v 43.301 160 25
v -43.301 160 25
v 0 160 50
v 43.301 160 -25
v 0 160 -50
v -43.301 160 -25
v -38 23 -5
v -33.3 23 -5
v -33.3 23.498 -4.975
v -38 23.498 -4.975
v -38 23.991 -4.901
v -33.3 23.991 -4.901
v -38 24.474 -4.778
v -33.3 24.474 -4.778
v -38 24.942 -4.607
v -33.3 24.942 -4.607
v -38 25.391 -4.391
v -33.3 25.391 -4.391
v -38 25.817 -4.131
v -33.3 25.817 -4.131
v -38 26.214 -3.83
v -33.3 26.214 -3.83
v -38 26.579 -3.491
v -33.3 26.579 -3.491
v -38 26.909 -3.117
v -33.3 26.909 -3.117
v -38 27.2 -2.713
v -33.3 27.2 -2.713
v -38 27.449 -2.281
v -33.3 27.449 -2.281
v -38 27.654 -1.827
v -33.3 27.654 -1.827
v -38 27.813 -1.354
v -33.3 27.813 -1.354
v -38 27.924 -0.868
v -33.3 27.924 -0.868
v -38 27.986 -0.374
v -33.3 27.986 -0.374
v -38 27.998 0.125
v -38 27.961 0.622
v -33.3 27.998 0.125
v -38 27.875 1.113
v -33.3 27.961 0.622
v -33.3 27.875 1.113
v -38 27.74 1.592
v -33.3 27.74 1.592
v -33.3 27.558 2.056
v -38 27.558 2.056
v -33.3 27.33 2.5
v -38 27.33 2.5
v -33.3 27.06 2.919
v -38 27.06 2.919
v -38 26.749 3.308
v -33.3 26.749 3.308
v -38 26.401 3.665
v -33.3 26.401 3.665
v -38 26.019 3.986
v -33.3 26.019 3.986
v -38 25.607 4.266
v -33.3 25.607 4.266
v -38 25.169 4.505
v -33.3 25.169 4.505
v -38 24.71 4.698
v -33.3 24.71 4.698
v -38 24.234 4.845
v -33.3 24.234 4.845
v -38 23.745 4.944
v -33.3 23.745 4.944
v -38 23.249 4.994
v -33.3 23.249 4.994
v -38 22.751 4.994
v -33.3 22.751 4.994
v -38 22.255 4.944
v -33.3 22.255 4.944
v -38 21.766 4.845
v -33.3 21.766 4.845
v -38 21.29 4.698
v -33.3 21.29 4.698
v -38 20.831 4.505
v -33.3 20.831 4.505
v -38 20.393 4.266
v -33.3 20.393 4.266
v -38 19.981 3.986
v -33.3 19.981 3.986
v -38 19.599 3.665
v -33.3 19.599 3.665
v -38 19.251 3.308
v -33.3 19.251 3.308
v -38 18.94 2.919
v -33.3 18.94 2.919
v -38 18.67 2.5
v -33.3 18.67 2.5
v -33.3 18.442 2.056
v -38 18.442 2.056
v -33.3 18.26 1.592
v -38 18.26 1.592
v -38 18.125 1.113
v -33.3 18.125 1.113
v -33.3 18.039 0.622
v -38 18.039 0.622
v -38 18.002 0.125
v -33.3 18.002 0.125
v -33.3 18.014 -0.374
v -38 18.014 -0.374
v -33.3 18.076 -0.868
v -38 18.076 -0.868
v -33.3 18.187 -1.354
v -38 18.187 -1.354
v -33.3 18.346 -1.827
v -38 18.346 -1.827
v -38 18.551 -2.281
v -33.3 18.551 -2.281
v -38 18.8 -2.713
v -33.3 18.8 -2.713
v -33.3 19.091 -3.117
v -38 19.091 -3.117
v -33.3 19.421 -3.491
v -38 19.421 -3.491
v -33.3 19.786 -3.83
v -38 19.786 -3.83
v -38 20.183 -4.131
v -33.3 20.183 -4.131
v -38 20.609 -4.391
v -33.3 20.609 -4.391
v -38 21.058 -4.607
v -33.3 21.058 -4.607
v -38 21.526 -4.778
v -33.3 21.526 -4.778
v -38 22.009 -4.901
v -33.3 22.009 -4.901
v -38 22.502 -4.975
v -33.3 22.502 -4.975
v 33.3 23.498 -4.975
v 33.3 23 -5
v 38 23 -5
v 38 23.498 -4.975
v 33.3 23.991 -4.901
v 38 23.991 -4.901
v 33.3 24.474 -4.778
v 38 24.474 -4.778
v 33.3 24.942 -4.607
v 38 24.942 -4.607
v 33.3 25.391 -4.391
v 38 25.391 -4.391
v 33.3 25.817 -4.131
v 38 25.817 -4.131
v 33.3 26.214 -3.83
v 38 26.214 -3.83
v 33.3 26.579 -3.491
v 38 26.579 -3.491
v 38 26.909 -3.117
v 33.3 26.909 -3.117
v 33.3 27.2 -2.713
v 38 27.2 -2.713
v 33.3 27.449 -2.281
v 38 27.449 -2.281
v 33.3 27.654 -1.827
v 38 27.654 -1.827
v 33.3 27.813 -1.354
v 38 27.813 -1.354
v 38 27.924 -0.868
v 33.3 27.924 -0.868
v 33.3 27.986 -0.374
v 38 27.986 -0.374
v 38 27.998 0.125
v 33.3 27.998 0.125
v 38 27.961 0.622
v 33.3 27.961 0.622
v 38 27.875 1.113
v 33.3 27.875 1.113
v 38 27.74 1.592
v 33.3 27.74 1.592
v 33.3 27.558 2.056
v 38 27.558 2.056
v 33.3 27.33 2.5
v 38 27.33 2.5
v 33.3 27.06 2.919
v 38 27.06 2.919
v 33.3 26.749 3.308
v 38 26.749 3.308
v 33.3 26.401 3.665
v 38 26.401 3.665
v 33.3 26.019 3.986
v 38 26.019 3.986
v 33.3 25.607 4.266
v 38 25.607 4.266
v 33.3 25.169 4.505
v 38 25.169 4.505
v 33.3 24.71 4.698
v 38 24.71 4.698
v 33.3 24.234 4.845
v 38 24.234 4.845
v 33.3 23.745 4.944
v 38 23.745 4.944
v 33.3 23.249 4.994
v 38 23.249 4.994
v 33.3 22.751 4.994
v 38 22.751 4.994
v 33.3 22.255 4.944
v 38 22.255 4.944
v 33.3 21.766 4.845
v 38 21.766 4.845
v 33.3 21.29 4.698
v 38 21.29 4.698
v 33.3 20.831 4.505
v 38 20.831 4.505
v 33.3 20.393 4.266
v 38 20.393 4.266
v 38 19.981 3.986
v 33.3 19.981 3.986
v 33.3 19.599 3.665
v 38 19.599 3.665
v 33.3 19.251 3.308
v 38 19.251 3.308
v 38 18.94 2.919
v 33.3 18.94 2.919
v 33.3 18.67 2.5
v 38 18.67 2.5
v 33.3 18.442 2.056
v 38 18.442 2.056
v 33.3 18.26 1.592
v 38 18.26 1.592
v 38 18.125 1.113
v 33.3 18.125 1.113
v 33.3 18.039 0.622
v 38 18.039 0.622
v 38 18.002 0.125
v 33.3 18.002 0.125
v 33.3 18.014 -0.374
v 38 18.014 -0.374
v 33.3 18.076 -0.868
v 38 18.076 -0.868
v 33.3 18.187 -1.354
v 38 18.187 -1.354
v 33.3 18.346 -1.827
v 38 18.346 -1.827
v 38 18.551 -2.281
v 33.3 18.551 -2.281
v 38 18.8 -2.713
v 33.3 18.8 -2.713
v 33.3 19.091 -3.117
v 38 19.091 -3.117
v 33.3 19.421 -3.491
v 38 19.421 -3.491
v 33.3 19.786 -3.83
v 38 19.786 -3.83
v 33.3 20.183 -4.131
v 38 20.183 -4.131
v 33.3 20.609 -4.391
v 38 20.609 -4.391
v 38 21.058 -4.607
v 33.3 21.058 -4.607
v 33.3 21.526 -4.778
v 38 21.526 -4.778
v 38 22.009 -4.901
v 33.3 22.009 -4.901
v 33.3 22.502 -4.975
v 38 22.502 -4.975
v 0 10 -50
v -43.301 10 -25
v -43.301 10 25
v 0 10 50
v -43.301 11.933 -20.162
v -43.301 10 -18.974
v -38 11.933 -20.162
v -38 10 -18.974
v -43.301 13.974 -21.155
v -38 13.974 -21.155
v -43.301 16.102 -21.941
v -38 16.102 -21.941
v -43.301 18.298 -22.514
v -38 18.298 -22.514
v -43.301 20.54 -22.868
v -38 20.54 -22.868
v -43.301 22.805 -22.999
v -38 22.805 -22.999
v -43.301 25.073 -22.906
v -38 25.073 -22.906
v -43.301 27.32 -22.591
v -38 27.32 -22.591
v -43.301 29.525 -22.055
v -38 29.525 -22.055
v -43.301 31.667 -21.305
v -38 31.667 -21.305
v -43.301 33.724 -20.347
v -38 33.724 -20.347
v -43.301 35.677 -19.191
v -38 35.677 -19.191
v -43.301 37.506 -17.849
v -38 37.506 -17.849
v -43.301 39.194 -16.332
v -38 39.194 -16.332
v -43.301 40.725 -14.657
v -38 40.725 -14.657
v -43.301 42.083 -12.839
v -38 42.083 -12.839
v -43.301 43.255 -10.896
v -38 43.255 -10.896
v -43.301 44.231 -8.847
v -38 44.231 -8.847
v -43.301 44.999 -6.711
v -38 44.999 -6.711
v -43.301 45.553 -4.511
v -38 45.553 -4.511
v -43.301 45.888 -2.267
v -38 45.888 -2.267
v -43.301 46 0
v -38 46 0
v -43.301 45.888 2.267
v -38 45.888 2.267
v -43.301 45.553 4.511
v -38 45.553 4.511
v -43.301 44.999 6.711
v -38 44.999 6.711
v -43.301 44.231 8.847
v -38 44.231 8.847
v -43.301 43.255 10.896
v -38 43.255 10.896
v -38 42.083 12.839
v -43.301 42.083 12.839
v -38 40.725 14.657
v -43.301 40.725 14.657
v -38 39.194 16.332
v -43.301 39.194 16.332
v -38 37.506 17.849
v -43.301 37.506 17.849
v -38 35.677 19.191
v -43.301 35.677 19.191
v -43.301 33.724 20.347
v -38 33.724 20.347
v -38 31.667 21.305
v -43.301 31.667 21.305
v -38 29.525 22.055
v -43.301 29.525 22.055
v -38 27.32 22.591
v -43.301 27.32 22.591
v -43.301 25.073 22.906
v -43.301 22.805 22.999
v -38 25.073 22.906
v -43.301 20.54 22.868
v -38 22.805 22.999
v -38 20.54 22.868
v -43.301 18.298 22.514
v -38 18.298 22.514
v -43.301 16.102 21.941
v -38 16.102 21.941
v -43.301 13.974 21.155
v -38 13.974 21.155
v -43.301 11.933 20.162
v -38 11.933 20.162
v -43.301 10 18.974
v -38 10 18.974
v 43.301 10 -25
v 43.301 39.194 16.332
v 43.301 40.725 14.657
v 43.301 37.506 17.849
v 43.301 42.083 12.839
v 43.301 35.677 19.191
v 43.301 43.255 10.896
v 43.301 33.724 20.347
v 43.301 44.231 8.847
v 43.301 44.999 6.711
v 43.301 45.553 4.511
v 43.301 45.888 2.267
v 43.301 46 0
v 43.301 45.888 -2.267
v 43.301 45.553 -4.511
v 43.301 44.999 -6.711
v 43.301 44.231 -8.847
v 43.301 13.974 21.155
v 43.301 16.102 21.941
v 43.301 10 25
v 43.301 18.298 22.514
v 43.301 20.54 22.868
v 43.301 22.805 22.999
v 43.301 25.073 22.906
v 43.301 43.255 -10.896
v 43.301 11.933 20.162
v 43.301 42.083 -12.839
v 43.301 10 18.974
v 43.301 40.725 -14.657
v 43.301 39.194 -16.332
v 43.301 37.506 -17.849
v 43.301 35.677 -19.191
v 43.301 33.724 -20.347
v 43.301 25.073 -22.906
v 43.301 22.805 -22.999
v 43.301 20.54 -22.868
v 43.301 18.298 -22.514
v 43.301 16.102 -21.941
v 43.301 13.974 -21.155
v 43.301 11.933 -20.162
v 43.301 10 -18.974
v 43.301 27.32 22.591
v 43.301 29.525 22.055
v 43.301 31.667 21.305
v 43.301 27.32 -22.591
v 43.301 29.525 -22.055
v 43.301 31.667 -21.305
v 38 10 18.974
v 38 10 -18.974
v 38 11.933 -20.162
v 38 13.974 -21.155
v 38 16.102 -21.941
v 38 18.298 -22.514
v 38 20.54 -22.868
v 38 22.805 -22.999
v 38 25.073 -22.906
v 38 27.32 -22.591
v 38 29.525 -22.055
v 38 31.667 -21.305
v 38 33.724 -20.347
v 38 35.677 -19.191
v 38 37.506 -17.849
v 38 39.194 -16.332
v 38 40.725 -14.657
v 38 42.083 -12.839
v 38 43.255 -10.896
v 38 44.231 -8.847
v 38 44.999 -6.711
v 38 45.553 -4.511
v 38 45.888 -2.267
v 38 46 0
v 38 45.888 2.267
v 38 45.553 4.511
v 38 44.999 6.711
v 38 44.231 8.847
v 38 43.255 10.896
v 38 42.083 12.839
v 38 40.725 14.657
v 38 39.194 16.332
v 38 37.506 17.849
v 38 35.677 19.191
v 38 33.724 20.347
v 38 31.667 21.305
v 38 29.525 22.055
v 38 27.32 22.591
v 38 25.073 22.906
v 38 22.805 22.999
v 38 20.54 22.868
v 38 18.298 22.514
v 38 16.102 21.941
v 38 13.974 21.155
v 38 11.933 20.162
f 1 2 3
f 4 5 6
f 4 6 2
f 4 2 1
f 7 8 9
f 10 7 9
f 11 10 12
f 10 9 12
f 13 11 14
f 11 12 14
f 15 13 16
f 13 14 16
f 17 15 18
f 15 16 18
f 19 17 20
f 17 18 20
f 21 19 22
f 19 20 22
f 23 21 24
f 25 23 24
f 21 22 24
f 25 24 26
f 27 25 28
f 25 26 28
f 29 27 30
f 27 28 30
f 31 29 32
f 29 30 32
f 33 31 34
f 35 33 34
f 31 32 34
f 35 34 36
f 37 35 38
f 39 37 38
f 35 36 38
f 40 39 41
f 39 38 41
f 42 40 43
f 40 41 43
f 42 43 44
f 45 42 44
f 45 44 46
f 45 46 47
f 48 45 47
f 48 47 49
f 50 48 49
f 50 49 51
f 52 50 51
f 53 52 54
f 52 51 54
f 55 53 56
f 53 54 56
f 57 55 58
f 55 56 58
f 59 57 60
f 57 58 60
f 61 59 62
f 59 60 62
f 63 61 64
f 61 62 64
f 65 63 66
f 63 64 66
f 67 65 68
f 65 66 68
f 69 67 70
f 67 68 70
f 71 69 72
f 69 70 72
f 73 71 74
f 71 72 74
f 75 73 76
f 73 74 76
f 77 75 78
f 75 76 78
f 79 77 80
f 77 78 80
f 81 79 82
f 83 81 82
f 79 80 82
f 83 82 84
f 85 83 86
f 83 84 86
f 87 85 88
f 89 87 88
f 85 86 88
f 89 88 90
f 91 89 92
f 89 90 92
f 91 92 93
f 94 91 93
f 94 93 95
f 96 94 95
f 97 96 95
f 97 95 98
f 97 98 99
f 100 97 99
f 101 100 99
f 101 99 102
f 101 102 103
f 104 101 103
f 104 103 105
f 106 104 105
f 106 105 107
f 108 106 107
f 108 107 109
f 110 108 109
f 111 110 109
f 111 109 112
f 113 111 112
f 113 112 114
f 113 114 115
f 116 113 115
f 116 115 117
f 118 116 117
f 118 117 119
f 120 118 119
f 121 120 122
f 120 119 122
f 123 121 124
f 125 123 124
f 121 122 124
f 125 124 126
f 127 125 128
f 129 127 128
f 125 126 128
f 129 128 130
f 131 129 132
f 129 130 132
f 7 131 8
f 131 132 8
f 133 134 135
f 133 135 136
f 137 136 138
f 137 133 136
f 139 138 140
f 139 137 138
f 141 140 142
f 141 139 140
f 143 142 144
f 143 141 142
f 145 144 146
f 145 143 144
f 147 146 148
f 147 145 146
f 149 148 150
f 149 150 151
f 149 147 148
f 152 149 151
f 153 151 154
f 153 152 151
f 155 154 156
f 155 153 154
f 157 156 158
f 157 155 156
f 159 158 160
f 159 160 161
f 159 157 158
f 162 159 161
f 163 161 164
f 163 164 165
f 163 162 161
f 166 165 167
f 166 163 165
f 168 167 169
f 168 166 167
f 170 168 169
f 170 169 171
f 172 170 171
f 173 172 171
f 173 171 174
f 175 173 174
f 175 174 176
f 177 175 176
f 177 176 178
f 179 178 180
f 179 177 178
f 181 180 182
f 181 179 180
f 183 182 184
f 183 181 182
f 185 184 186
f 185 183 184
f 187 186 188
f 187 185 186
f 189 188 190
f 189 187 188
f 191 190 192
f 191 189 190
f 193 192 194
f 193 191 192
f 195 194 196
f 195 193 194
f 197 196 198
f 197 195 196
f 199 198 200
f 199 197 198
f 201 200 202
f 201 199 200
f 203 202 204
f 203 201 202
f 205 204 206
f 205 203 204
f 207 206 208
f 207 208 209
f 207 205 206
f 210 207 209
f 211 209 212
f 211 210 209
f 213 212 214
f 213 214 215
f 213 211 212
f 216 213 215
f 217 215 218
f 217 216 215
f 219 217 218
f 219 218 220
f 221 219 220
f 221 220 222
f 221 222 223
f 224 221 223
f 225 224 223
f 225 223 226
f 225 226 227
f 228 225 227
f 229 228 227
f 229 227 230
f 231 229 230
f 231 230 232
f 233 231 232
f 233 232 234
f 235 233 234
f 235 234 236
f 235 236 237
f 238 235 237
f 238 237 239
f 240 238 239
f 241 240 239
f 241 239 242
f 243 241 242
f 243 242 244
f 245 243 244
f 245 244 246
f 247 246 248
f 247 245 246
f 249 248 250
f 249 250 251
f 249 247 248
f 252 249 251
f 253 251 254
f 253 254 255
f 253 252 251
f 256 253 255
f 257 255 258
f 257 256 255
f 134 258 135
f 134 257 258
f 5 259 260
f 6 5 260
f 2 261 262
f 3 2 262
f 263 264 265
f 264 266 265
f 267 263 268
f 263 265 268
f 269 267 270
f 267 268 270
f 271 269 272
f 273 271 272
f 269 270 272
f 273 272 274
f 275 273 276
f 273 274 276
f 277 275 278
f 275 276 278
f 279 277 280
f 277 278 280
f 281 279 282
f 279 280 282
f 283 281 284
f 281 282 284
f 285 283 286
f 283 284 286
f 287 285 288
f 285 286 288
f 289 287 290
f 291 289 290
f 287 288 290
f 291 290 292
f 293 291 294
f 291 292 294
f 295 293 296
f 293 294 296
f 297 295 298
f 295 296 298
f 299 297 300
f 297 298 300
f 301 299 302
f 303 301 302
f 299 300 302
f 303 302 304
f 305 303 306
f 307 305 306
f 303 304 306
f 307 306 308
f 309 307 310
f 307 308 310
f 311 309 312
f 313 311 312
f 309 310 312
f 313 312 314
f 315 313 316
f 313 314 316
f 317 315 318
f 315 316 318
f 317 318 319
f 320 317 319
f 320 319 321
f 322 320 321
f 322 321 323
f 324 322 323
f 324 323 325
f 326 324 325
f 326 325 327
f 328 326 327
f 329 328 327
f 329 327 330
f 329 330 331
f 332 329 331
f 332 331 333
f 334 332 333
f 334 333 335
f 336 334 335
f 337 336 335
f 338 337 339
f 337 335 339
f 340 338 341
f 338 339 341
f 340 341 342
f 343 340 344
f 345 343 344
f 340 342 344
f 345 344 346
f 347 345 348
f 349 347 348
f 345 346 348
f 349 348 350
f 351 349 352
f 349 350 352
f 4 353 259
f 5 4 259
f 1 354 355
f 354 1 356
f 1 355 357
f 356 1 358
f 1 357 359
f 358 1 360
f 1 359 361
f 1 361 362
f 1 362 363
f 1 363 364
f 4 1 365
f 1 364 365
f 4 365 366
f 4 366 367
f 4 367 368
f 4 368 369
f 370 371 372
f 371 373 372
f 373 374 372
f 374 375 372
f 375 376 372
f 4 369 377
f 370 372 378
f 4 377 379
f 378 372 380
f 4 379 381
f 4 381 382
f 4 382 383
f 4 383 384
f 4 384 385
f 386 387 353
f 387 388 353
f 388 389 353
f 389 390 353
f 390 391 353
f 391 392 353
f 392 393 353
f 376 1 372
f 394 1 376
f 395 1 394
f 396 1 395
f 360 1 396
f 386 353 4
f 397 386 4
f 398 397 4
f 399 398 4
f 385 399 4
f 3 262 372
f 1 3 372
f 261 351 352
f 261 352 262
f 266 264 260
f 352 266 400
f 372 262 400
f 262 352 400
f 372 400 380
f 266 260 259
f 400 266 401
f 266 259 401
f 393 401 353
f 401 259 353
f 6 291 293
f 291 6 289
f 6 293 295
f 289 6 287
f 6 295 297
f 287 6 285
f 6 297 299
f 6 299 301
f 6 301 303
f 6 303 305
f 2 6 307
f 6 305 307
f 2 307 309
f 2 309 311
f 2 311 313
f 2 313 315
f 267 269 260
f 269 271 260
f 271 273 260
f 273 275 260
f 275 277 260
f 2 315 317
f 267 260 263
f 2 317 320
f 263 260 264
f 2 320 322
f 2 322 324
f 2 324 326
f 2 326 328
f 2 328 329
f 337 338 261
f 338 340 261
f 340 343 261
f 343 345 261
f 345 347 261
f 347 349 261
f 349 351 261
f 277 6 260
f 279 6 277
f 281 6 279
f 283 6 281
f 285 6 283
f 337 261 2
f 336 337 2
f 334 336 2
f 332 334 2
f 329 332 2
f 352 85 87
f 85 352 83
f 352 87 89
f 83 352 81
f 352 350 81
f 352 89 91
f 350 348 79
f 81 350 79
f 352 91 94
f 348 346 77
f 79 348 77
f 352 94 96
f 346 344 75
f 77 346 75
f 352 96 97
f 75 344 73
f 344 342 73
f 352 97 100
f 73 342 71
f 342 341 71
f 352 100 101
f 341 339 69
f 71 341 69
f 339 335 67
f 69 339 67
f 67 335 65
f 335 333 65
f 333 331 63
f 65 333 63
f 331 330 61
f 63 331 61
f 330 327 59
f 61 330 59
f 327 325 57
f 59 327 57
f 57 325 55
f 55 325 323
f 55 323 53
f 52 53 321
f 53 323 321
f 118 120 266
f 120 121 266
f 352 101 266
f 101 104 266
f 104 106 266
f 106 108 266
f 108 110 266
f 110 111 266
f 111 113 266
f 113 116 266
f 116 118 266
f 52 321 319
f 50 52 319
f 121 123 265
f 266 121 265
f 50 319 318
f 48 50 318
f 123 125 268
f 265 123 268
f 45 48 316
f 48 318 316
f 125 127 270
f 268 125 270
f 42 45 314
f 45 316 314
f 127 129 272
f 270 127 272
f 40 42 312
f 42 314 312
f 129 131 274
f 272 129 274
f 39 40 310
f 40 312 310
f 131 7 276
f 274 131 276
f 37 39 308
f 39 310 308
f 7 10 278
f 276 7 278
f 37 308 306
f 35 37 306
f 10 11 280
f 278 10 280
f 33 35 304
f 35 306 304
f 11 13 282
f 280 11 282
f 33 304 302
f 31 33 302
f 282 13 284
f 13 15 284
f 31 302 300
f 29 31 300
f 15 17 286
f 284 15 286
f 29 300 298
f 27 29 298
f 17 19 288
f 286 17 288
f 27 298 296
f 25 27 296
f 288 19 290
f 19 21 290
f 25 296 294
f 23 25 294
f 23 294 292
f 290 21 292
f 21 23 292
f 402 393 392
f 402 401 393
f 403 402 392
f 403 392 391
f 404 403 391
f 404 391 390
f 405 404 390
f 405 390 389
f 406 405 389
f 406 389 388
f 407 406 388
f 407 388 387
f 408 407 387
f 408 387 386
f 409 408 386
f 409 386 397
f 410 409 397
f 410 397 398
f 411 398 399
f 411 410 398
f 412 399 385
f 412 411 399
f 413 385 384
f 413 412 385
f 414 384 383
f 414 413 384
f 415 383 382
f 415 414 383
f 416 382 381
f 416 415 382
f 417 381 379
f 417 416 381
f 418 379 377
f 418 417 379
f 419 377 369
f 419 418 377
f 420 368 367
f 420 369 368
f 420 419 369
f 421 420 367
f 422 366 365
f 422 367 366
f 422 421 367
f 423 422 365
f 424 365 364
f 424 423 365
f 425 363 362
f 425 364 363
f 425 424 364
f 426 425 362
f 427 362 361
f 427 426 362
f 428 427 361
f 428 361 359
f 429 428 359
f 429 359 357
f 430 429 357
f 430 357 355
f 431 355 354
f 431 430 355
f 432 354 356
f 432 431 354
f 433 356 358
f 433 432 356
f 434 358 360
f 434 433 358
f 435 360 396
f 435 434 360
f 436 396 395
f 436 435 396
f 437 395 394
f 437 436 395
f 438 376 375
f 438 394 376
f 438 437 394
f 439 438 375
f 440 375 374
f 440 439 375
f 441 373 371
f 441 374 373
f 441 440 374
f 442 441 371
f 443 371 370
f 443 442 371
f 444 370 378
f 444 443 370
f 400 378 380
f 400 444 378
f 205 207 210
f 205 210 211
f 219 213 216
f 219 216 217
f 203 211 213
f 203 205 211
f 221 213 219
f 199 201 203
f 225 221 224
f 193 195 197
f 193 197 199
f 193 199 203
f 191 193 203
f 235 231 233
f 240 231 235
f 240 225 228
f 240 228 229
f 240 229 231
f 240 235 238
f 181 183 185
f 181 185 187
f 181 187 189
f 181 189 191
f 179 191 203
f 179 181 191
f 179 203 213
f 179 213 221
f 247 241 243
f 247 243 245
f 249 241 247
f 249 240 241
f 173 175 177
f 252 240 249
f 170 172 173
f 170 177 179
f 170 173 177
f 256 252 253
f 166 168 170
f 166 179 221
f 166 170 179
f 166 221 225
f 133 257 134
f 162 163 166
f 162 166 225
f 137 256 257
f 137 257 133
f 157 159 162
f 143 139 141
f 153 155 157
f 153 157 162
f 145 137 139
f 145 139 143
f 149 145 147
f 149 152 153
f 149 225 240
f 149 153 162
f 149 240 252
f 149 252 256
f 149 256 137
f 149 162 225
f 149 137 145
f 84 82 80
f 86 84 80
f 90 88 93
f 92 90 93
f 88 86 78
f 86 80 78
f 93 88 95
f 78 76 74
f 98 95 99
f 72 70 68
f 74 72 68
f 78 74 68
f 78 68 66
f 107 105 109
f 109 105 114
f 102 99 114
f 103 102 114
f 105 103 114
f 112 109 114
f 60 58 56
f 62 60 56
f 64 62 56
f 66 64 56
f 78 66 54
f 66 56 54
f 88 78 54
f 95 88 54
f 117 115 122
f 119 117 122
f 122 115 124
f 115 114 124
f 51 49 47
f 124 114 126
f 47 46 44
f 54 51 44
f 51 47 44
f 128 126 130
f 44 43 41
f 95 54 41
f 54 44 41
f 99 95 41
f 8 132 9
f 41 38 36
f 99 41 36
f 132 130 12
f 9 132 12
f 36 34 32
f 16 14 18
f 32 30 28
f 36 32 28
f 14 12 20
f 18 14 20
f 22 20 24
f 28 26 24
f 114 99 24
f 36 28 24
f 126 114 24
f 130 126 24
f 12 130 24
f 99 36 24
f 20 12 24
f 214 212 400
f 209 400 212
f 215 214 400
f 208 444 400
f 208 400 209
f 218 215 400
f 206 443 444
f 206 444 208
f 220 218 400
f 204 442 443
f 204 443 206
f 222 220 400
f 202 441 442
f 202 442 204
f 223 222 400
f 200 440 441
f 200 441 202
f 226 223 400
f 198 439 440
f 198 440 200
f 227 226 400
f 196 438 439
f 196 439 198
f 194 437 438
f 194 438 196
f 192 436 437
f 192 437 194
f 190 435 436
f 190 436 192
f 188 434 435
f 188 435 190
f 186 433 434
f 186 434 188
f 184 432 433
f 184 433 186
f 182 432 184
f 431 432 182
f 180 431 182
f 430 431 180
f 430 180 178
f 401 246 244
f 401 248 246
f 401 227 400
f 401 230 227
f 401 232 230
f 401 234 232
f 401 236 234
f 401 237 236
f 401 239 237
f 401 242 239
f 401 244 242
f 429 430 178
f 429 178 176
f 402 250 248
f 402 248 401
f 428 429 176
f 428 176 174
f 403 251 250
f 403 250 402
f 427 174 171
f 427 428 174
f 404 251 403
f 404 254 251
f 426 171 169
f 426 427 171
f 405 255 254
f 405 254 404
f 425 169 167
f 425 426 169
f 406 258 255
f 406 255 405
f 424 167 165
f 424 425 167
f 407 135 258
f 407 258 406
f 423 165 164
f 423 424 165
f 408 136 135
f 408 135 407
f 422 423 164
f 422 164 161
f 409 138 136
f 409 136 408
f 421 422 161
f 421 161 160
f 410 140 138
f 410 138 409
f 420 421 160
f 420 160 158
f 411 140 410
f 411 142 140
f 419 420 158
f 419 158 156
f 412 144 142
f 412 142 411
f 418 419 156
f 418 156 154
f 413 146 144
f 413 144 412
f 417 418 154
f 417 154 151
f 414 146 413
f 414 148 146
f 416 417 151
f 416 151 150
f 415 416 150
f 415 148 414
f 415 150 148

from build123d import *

# Parameters (mm, degrees)
BOSS_EXTRUDE1_START = 10
BOSS_EXTRUDE1_DEPTH = 150
CUT_EXTRUDE1_START  = -38
SKETCH3_R           = 23
CUT_EXTRUDE1_DEPTH  = 81.301270189
CUT_EXTRUDE2_START  = -33.3
SKETCH4_R           = 5
CUT_EXTRUDE2_DEPTH  = 4.7


with BuildPart() as part:
    # Sketch1 → Boss-Extrude1 (new body)
    with BuildSketch(Plane(origin=(0, 0, 0), x_dir=(1, 0, 0), z_dir=(0, 1, 0)).offset(BOSS_EXTRUDE1_START)):
        Polygon((0, 50), (-43.301270189, 25), (-43.301270189, -25), (0, -50), (43.301270189, -25), (43.301270189, 25), align=None)
    extrude(amount=BOSS_EXTRUDE1_DEPTH)

    # Sketch3 → Cut-Extrude1 (cut)
    with BuildSketch(Plane(origin=(0, 0, 0), x_dir=(0, 0, -1), z_dir=(1, 0, 0)).offset(CUT_EXTRUDE1_START)):
        with Locations((0, 23)):
            Circle(SKETCH3_R)
    cut_extrude1 = extrude(amount=-CUT_EXTRUDE1_DEPTH, mode=Mode.SUBTRACT)

    # Sketch4 → Cut-Extrude2 (cut)
    with BuildSketch(Plane(origin=(0, 0, 0), x_dir=(0, 0, -1), z_dir=(1, 0, 0)).offset(CUT_EXTRUDE2_START)):
        with Locations((0, 23)):
            Circle(SKETCH4_R)
    cut_extrude2 = extrude(amount=-CUT_EXTRUDE2_DEPTH, mode=Mode.SUBTRACT)

    # Mirror4: Cut-Extrude1, Cut-Extrude2 across plane
    add(cut_extrude1.mirror(Plane(origin=(0, 0, 0), x_dir=(0, 0, 1), z_dir=(1, 0, 0))), mode=Mode.SUBTRACT)
    add(cut_extrude2.mirror(Plane(origin=(0, 0, 0), x_dir=(0, 0, 1), z_dir=(1, 0, 0))), mode=Mode.SUBTRACT)


solid = part.part
